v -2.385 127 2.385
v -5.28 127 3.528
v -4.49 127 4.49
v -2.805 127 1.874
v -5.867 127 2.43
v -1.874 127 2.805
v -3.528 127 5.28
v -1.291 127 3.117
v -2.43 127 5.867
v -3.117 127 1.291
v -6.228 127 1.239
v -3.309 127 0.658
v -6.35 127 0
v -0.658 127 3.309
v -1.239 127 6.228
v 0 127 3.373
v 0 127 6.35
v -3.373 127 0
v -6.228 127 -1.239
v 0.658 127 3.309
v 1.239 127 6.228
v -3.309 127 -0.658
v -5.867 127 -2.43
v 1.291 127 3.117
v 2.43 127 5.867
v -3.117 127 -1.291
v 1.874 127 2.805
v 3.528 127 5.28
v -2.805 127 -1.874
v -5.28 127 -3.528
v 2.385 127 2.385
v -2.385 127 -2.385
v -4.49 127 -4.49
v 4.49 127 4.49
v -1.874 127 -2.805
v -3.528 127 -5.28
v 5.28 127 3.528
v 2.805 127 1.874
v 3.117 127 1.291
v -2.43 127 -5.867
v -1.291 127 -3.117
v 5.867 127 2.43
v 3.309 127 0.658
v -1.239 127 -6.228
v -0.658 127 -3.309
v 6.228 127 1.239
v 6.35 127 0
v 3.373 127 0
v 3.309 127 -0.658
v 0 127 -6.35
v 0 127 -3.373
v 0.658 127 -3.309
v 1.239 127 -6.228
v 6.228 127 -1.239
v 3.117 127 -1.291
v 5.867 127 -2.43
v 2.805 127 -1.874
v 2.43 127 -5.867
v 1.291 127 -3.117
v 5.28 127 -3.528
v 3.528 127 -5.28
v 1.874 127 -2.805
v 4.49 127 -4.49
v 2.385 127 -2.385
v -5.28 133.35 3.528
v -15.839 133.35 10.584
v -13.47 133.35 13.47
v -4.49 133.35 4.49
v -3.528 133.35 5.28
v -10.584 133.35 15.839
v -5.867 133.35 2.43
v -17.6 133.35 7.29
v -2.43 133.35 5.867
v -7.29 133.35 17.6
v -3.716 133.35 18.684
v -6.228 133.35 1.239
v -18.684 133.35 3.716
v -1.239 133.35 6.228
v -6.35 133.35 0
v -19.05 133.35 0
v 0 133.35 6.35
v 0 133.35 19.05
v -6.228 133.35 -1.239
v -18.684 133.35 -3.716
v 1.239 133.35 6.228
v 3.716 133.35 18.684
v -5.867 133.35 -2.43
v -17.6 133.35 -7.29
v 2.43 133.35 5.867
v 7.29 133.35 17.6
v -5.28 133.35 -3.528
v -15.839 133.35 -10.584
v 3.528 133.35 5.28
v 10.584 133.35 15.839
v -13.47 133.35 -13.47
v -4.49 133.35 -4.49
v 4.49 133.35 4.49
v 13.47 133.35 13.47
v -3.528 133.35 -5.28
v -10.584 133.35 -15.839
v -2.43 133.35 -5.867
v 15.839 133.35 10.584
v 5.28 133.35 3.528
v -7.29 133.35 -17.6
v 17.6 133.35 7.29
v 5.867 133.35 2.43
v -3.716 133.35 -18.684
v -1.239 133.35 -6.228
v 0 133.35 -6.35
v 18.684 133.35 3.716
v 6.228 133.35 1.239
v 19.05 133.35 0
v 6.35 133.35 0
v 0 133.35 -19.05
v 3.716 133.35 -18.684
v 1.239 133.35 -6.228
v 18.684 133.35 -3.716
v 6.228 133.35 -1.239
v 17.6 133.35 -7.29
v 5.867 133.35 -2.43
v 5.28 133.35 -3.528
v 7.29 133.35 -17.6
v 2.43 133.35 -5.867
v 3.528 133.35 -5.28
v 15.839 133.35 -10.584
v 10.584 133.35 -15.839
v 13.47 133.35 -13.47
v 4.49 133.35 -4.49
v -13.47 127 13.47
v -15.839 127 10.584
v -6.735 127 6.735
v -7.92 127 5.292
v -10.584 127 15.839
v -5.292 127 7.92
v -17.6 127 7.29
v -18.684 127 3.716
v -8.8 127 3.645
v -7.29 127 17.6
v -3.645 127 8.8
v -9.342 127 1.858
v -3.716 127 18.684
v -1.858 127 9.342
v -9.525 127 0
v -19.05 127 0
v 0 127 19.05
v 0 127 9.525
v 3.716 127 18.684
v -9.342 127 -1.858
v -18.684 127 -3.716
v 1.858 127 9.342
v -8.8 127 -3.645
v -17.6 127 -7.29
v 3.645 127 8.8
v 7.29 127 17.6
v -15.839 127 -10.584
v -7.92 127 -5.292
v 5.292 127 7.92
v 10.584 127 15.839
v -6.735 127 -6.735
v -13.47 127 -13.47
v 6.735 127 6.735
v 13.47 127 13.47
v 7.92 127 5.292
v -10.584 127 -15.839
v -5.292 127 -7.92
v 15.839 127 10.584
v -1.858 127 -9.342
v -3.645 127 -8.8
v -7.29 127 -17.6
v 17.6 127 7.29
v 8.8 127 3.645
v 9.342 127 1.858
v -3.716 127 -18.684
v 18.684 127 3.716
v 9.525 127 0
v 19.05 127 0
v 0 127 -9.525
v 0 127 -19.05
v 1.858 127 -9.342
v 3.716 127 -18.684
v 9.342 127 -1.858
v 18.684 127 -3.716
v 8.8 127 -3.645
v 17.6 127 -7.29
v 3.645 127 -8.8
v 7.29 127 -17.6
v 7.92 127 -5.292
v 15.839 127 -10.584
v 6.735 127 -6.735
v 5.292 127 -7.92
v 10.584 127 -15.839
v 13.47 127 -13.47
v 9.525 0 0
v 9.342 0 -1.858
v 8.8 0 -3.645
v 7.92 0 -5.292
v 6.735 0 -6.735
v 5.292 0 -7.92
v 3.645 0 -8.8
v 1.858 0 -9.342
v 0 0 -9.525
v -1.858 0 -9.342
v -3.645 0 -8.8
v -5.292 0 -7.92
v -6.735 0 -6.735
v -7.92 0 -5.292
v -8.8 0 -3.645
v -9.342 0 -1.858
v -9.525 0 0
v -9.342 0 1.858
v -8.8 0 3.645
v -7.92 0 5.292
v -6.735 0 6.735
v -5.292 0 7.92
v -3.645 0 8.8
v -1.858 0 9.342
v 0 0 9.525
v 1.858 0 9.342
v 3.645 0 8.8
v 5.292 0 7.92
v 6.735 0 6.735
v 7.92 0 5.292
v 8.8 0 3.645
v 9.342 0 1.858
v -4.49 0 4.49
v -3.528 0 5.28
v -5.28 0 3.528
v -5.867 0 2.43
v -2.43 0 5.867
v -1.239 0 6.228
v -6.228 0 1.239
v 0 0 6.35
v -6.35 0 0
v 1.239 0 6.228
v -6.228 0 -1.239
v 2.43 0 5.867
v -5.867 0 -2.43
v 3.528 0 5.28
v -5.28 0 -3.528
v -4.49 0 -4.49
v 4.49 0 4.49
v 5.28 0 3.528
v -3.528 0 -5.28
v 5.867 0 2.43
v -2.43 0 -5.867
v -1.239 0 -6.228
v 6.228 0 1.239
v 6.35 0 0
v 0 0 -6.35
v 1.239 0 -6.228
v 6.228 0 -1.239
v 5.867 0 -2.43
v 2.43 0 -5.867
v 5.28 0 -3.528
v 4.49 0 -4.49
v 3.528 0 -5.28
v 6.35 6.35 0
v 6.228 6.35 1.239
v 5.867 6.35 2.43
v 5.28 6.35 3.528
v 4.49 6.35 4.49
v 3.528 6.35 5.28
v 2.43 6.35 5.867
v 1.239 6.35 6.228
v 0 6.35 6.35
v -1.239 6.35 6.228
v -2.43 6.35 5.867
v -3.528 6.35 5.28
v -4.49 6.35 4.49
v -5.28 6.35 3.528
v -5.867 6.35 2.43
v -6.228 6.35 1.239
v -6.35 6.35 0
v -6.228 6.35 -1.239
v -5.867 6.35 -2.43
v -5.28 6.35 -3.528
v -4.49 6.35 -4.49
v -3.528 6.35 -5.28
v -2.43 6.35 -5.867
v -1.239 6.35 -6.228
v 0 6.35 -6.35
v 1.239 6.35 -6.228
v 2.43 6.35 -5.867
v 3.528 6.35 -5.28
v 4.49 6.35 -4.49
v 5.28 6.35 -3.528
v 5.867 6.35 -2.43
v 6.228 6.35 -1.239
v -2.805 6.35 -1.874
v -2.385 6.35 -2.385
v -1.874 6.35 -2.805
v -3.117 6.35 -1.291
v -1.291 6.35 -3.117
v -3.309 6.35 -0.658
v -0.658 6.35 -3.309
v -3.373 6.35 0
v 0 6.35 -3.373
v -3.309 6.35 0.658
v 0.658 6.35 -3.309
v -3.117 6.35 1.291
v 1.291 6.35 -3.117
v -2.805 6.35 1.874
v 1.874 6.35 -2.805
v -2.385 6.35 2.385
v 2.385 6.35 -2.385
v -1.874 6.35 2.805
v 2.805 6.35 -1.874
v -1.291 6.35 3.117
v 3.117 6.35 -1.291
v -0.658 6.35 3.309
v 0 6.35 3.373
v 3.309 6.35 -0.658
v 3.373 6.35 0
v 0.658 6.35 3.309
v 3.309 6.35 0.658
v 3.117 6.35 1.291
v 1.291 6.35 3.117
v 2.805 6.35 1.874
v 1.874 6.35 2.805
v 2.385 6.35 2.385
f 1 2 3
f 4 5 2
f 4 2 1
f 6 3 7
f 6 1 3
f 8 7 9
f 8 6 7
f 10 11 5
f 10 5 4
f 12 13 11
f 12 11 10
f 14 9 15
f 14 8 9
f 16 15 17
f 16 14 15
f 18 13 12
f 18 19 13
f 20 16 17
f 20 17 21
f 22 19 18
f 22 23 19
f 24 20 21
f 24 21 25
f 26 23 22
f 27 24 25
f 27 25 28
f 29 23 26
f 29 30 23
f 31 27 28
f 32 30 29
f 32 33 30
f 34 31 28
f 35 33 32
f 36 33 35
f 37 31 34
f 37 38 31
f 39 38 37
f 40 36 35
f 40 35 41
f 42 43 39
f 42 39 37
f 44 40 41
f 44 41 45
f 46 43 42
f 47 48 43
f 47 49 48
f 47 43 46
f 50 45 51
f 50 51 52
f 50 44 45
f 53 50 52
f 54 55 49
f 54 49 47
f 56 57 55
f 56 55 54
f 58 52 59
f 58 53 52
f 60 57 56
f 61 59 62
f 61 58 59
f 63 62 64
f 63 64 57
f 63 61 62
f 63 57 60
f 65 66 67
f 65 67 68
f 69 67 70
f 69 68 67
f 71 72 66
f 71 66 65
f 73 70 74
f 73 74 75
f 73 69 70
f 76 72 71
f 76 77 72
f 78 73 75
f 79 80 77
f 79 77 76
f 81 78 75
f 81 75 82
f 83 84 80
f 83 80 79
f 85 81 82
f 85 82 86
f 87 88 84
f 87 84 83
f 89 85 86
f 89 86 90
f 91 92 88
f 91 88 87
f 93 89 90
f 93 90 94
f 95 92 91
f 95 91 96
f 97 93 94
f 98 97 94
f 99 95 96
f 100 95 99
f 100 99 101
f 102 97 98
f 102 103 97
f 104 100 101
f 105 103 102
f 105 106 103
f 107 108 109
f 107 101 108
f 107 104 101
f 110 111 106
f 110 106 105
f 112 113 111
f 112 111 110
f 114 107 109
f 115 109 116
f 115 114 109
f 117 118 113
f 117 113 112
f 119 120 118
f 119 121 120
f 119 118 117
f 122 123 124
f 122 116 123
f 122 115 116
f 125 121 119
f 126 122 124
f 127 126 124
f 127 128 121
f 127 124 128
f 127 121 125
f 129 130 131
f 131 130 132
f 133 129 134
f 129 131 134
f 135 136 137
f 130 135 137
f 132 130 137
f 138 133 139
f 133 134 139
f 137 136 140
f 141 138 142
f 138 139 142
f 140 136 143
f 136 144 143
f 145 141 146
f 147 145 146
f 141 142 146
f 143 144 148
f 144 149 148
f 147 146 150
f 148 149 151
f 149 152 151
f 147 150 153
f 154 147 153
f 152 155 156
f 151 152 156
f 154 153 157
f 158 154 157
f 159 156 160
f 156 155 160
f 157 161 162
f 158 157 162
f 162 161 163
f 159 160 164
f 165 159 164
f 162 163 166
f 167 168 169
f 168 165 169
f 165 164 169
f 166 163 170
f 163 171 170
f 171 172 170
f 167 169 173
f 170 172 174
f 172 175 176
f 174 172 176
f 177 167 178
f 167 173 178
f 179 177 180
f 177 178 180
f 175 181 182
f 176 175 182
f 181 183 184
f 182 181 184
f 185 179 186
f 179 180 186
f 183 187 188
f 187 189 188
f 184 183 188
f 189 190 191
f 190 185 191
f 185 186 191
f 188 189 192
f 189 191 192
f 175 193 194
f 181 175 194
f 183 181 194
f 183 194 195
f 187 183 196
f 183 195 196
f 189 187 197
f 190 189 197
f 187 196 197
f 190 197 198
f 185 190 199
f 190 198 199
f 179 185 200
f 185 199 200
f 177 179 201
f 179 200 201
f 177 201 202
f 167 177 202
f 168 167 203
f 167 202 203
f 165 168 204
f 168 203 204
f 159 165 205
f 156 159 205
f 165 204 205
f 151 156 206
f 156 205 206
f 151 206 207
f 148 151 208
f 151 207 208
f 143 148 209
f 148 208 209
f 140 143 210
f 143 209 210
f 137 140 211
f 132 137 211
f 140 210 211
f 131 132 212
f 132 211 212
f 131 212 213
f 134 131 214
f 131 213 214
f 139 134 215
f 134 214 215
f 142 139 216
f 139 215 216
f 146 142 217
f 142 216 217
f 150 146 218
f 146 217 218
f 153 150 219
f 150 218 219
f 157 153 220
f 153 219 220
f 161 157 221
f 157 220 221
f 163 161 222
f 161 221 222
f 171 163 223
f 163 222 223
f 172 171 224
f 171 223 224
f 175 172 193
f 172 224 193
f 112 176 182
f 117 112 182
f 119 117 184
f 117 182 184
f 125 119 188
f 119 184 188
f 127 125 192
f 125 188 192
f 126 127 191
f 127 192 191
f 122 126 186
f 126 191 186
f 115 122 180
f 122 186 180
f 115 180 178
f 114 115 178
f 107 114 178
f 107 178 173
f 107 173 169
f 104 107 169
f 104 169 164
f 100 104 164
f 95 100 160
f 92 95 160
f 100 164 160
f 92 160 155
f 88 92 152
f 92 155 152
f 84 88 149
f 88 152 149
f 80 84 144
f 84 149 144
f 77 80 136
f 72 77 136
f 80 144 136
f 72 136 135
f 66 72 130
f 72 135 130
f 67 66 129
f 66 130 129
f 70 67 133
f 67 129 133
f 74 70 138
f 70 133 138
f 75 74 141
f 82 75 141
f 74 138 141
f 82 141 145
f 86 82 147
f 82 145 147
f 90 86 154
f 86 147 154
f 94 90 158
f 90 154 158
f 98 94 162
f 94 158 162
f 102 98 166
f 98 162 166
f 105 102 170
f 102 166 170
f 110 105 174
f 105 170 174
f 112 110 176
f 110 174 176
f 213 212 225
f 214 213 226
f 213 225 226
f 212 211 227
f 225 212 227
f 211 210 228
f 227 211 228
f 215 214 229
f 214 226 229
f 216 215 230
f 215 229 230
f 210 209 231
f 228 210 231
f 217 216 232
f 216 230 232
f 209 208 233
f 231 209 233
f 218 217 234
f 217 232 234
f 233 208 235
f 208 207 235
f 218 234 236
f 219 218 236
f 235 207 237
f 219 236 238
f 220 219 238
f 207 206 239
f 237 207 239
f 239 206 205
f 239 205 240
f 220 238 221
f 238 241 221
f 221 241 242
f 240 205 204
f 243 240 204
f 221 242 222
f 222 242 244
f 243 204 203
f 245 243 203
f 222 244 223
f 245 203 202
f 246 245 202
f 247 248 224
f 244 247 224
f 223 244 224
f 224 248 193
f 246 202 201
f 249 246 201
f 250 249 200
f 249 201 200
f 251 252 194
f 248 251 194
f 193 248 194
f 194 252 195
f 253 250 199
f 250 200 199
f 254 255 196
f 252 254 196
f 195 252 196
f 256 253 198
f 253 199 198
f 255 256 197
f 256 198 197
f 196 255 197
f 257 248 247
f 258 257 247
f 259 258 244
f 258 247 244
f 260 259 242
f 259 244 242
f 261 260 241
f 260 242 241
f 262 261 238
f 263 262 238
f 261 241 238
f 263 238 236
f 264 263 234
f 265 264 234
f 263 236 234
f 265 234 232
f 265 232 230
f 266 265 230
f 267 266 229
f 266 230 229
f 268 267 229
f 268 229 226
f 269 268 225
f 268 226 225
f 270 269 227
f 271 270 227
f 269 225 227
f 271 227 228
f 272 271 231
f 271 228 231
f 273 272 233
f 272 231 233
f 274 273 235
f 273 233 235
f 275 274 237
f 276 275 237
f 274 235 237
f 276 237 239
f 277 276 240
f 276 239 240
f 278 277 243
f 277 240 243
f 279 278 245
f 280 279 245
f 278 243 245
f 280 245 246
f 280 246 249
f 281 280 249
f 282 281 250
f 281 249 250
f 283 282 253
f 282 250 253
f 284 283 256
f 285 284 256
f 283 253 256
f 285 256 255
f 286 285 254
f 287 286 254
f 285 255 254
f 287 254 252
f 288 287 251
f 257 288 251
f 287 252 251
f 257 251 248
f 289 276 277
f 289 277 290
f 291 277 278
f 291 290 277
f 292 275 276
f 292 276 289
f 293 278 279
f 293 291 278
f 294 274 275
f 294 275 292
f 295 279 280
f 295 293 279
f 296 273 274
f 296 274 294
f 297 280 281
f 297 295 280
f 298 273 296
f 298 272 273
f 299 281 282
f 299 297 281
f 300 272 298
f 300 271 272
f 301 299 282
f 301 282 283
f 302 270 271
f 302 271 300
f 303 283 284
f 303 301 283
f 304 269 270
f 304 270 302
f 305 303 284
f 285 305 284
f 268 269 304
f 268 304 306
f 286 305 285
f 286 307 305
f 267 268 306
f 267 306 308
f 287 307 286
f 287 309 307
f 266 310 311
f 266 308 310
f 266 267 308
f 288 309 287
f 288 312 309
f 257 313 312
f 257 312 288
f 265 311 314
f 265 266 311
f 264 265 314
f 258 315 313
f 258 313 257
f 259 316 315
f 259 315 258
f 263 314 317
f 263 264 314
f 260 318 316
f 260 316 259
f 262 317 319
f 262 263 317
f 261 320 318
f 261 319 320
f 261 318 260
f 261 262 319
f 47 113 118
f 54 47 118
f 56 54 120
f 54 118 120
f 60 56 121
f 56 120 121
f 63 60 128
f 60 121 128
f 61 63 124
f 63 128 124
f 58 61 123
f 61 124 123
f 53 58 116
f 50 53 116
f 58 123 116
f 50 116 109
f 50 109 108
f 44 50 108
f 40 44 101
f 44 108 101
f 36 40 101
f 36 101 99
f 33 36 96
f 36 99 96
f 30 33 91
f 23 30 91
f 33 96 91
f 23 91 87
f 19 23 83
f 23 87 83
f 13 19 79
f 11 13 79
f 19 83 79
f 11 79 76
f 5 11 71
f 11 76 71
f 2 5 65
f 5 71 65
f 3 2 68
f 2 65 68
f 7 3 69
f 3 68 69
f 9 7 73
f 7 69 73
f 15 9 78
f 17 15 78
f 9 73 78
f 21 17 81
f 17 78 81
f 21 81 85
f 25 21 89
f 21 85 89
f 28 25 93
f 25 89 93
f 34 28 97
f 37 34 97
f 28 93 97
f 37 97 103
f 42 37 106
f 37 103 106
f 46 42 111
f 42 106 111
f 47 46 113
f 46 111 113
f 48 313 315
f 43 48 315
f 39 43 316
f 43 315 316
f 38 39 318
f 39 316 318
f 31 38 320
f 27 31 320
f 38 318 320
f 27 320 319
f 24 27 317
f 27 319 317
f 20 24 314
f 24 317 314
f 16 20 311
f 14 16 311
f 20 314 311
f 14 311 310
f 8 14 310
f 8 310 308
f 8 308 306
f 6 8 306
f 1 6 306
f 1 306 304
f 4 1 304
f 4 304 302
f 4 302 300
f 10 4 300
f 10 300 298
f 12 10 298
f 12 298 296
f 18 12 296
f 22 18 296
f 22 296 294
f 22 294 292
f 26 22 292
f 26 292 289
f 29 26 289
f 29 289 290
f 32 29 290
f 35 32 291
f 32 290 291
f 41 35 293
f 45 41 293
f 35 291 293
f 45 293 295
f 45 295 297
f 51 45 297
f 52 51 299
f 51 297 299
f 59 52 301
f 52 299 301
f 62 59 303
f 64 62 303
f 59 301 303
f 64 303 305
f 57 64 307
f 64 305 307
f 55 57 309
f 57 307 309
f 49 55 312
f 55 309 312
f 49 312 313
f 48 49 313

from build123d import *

# Parameters (mm, degrees)
SKETCH1_R           = 9.525
BOSS_EXTRUDE1_DEPTH = 127
SKETCH2_R           = 19.05
BOSS_EXTRUDE2_DEPTH = 6.35
SKETCH3_R           = 6.35
CUT_EXTRUDE1_DEPTH  = 6.35
SKETCH4_R           = 6.35
CUT_EXTRUDE2_DEPTH  = 6.35
SKETCH5_R           = 3.3734375
CUT_EXTRUDE3_DEPTH  = 128


with BuildPart() as part:
    # Sketch1 → Boss-Extrude1 (new body)
    with BuildSketch(Plane(origin=(0, 0, 0), x_dir=(1, 0, 0), z_dir=(0, 1, 0))):
        Circle(SKETCH1_R)
    extrude(amount=BOSS_EXTRUDE1_DEPTH)

    # Sketch2 → Boss-Extrude2 (add)
    with BuildSketch(Plane(origin=(0, 127, 0), x_dir=(1, 0, 0), z_dir=(0, 1, 0))):
        Circle(SKETCH2_R)
    extrude(amount=BOSS_EXTRUDE2_DEPTH)

    # Sketch3 → Cut-Extrude1 (cut)
    with BuildSketch(Plane(origin=(0, 133.35, 0), x_dir=(1, 0, 0), z_dir=(0, 1, 0))):
        Circle(SKETCH3_R)
    extrude(amount=-CUT_EXTRUDE1_DEPTH, mode=Mode.SUBTRACT)

    # Sketch4 → Cut-Extrude2 (cut)
    with BuildSketch(Plane.XZ):
        Circle(SKETCH4_R)
    extrude(amount=-CUT_EXTRUDE2_DEPTH, mode=Mode.SUBTRACT)

    # Sketch5 → Cut-Extrude3 (cut, through all)
    with BuildSketch(Plane.XZ.offset(-6.35)):
        Circle(SKETCH5_R)
    extrude(amount=-CUT_EXTRUDE3_DEPTH, mode=Mode.SUBTRACT)


solid = part.part
